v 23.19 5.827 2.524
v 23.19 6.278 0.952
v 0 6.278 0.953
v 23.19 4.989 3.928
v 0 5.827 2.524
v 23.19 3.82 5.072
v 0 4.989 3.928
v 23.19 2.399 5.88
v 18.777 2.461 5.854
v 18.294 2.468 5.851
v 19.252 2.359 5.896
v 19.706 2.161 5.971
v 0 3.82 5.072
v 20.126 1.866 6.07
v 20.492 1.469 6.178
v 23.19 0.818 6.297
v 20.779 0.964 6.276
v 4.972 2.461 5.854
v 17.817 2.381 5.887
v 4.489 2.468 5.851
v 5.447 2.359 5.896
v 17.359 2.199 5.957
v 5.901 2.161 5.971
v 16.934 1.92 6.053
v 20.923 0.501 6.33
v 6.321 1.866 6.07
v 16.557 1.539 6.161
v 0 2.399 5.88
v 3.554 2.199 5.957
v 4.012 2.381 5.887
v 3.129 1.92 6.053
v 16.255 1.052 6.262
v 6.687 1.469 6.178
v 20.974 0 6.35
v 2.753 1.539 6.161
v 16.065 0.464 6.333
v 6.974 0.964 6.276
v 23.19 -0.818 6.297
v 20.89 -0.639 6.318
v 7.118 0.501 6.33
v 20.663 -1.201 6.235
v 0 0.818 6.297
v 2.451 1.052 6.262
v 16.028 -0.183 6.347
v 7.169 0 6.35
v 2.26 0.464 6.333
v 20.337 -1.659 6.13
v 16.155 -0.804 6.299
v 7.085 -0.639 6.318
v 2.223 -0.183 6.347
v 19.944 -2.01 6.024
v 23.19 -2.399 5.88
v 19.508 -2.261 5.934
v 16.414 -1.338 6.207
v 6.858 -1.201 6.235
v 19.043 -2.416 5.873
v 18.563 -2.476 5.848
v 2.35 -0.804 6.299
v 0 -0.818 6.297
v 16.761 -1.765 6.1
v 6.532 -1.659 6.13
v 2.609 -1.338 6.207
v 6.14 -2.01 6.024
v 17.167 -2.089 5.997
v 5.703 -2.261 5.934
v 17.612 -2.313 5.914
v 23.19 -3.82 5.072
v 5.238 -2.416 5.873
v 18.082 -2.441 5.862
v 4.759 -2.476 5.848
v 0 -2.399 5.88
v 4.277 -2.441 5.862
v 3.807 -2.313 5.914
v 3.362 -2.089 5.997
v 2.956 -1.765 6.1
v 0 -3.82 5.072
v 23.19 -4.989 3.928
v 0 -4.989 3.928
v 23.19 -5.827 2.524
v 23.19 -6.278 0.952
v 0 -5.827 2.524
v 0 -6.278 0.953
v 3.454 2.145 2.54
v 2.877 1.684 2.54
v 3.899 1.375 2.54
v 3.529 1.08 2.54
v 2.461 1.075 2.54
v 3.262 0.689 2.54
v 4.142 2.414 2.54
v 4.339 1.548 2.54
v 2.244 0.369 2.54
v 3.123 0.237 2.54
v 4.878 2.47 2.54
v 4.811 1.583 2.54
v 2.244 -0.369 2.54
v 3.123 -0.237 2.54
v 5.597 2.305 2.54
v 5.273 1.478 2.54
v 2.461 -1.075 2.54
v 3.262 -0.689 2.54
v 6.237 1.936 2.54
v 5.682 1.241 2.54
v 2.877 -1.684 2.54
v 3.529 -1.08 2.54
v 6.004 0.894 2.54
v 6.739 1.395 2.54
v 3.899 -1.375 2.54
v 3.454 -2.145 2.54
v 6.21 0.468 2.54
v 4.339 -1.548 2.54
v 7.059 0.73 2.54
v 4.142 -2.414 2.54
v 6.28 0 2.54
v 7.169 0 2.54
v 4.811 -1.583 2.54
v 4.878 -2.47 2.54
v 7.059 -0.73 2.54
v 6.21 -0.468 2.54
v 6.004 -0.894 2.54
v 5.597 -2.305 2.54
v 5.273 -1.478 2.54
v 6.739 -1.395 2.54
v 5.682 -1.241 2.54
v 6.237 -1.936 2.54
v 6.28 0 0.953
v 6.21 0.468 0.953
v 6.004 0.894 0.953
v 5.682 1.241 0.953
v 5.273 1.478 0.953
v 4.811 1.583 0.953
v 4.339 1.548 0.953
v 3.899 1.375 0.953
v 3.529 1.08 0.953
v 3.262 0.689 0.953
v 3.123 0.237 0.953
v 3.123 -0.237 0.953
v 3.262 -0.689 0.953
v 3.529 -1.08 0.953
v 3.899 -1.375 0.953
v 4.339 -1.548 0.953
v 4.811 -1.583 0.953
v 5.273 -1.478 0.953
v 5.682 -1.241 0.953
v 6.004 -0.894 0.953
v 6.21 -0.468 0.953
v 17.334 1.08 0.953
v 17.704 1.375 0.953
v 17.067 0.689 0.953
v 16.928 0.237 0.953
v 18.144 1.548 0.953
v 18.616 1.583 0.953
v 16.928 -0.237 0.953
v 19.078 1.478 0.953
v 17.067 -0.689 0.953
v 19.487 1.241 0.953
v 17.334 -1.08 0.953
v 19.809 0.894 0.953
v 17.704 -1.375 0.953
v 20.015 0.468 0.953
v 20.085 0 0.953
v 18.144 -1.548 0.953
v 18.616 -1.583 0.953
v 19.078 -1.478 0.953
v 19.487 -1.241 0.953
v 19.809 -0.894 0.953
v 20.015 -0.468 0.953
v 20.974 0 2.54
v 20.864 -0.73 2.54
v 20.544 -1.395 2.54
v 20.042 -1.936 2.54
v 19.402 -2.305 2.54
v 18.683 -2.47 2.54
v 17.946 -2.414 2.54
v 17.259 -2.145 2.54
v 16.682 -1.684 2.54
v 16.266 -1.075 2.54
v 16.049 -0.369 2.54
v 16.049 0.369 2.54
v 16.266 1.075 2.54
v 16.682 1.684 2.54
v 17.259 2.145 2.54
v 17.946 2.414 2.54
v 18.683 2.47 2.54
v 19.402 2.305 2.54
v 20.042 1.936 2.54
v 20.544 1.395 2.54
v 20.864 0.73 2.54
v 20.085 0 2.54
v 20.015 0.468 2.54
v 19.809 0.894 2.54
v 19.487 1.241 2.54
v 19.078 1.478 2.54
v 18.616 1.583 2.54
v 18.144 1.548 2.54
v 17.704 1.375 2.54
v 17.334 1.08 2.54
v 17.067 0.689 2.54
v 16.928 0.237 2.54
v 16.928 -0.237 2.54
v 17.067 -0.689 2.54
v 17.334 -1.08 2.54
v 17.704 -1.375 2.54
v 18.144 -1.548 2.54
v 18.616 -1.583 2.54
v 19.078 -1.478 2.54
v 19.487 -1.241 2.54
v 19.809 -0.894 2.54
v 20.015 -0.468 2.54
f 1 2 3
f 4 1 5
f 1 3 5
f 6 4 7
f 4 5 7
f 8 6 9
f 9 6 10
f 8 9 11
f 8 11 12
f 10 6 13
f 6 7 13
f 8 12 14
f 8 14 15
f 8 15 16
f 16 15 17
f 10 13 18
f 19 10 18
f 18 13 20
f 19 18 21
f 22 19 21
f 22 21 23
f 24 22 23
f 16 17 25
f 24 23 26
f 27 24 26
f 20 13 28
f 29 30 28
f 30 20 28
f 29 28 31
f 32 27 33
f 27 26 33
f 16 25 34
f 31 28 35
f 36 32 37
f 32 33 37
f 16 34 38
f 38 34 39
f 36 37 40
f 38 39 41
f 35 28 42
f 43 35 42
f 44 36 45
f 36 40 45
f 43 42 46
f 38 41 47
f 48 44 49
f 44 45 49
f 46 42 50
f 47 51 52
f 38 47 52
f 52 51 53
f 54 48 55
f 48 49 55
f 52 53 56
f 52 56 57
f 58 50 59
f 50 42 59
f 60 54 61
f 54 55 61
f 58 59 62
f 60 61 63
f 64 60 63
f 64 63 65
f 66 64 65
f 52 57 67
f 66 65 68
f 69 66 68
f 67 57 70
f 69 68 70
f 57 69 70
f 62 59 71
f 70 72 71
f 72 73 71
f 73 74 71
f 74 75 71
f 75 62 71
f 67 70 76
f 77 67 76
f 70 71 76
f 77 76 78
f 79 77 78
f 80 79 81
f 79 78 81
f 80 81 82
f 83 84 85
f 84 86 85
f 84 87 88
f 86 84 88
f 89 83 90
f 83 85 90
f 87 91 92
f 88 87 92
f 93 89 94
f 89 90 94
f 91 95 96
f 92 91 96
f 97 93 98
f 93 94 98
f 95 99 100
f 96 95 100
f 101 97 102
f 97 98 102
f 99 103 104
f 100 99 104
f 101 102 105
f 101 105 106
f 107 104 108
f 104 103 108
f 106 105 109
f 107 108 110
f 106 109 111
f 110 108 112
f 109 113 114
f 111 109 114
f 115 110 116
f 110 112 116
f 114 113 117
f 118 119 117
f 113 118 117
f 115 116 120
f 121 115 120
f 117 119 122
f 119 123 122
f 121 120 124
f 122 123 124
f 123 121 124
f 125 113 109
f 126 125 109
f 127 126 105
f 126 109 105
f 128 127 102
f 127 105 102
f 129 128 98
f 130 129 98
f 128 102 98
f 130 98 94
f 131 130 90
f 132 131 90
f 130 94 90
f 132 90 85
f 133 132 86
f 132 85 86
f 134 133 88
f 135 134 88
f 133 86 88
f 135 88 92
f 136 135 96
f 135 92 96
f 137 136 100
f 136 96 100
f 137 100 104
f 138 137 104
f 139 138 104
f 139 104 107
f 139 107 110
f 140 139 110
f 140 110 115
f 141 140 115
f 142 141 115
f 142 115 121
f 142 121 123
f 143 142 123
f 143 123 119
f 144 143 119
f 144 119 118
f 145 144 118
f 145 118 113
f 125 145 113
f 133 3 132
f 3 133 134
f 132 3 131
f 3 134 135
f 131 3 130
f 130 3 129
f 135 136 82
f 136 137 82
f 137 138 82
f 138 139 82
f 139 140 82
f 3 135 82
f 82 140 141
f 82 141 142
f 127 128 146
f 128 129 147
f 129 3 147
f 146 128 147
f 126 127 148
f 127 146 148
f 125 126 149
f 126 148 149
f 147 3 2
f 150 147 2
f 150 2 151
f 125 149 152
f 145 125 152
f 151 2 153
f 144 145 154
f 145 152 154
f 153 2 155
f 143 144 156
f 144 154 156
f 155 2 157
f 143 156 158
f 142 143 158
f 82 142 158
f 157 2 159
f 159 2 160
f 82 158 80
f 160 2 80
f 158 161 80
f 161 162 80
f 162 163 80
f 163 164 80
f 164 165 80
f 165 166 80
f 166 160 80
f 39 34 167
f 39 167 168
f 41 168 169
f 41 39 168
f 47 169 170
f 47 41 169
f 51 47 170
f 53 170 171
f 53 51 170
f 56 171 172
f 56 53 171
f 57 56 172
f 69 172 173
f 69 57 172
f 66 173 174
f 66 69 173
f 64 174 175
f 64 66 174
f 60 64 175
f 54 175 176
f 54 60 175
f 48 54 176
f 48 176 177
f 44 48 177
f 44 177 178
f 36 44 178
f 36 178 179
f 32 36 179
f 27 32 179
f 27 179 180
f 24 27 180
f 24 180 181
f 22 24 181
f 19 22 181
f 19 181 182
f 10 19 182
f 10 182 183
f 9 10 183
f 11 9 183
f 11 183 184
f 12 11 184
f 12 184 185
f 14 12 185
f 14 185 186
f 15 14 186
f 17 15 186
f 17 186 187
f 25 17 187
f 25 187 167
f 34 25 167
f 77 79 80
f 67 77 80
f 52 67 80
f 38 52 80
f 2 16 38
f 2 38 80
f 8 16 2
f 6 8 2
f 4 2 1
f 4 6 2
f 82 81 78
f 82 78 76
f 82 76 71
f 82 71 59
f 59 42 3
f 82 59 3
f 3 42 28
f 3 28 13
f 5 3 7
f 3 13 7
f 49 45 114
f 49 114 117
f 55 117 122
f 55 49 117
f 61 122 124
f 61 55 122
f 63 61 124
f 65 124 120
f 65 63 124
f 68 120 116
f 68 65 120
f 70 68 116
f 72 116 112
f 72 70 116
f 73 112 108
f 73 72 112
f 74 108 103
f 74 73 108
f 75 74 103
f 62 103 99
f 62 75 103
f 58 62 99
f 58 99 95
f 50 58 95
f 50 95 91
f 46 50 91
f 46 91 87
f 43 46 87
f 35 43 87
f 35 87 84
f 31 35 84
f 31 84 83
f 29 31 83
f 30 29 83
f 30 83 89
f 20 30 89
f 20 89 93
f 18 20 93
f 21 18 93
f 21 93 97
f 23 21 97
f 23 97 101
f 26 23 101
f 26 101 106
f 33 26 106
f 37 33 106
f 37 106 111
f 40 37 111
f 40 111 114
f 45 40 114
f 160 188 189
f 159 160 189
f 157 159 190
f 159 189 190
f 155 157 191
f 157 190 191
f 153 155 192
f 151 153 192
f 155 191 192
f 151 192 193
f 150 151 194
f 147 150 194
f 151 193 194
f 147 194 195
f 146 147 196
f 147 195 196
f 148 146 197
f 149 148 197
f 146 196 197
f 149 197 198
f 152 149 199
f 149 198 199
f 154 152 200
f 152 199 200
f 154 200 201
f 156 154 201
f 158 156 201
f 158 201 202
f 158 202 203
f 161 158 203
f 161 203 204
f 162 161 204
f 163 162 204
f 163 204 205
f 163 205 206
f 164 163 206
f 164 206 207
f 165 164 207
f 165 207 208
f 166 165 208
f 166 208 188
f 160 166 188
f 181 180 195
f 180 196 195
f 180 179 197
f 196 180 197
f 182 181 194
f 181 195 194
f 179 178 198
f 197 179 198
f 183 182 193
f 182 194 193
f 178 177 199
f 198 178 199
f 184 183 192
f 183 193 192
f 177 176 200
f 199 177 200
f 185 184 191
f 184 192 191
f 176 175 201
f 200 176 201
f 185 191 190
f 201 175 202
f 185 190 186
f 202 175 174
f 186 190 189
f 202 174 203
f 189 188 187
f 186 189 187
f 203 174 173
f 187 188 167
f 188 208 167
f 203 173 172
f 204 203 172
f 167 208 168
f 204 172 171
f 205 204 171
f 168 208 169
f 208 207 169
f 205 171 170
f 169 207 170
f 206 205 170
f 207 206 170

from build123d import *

# Parameters (mm, degrees)
F0_R     = 6.35
F1_DEPTH = 23.1902
F3_DEPTH = 23.1912
F5_R     = 2.4765
F6_DEPTH = 3.81
F7_R     = 1.5875
F8_DEPTH = 1.5885001


with BuildPart() as f1:
    # F0 (on Right) → F1 (new body)
    with BuildSketch(Plane.YZ):
        Circle(F0_R)
    extrude(amount=F1_DEPTH)

    # F2 (on face) → F3 (cut, through all)
    with BuildSketch(Plane.YZ.offset(23.1902)):
        with BuildLine():
            Line((6.2781560788, 0.9525), (-6.2781560788, 0.9525))
            ThreePointArc((-6.2781560788, 0.9525), (0, -6.35), (6.2781560788, 0.9525))
        make_face()
    extrude(amount=-F3_DEPTH, mode=Mode.SUBTRACT)

    # F5 (on offset) → F6 (cut)
    with BuildSketch(Plane(origin=(0, 0, 6.35), x_dir=(1, 0, 0), z_dir=(0, 0, -1))):
        with Locations((4.69265, 0)):
            Circle(F5_R)
        with Locations((18.49755, 0)):
            Circle(F5_R)
    extrude(amount=F6_DEPTH, mode=Mode.SUBTRACT)

    # F7 (on face) → F8 (cut, through all)
    with BuildSketch(Plane.XY.offset(2.54)):
        with Locations((4.69265, 0)):
            Circle(F7_R)
        with Locations((18.49755, 0)):
            Circle(F7_R)
    extrude(amount=-F8_DEPTH, mode=Mode.SUBTRACT)


solid = f1.part
